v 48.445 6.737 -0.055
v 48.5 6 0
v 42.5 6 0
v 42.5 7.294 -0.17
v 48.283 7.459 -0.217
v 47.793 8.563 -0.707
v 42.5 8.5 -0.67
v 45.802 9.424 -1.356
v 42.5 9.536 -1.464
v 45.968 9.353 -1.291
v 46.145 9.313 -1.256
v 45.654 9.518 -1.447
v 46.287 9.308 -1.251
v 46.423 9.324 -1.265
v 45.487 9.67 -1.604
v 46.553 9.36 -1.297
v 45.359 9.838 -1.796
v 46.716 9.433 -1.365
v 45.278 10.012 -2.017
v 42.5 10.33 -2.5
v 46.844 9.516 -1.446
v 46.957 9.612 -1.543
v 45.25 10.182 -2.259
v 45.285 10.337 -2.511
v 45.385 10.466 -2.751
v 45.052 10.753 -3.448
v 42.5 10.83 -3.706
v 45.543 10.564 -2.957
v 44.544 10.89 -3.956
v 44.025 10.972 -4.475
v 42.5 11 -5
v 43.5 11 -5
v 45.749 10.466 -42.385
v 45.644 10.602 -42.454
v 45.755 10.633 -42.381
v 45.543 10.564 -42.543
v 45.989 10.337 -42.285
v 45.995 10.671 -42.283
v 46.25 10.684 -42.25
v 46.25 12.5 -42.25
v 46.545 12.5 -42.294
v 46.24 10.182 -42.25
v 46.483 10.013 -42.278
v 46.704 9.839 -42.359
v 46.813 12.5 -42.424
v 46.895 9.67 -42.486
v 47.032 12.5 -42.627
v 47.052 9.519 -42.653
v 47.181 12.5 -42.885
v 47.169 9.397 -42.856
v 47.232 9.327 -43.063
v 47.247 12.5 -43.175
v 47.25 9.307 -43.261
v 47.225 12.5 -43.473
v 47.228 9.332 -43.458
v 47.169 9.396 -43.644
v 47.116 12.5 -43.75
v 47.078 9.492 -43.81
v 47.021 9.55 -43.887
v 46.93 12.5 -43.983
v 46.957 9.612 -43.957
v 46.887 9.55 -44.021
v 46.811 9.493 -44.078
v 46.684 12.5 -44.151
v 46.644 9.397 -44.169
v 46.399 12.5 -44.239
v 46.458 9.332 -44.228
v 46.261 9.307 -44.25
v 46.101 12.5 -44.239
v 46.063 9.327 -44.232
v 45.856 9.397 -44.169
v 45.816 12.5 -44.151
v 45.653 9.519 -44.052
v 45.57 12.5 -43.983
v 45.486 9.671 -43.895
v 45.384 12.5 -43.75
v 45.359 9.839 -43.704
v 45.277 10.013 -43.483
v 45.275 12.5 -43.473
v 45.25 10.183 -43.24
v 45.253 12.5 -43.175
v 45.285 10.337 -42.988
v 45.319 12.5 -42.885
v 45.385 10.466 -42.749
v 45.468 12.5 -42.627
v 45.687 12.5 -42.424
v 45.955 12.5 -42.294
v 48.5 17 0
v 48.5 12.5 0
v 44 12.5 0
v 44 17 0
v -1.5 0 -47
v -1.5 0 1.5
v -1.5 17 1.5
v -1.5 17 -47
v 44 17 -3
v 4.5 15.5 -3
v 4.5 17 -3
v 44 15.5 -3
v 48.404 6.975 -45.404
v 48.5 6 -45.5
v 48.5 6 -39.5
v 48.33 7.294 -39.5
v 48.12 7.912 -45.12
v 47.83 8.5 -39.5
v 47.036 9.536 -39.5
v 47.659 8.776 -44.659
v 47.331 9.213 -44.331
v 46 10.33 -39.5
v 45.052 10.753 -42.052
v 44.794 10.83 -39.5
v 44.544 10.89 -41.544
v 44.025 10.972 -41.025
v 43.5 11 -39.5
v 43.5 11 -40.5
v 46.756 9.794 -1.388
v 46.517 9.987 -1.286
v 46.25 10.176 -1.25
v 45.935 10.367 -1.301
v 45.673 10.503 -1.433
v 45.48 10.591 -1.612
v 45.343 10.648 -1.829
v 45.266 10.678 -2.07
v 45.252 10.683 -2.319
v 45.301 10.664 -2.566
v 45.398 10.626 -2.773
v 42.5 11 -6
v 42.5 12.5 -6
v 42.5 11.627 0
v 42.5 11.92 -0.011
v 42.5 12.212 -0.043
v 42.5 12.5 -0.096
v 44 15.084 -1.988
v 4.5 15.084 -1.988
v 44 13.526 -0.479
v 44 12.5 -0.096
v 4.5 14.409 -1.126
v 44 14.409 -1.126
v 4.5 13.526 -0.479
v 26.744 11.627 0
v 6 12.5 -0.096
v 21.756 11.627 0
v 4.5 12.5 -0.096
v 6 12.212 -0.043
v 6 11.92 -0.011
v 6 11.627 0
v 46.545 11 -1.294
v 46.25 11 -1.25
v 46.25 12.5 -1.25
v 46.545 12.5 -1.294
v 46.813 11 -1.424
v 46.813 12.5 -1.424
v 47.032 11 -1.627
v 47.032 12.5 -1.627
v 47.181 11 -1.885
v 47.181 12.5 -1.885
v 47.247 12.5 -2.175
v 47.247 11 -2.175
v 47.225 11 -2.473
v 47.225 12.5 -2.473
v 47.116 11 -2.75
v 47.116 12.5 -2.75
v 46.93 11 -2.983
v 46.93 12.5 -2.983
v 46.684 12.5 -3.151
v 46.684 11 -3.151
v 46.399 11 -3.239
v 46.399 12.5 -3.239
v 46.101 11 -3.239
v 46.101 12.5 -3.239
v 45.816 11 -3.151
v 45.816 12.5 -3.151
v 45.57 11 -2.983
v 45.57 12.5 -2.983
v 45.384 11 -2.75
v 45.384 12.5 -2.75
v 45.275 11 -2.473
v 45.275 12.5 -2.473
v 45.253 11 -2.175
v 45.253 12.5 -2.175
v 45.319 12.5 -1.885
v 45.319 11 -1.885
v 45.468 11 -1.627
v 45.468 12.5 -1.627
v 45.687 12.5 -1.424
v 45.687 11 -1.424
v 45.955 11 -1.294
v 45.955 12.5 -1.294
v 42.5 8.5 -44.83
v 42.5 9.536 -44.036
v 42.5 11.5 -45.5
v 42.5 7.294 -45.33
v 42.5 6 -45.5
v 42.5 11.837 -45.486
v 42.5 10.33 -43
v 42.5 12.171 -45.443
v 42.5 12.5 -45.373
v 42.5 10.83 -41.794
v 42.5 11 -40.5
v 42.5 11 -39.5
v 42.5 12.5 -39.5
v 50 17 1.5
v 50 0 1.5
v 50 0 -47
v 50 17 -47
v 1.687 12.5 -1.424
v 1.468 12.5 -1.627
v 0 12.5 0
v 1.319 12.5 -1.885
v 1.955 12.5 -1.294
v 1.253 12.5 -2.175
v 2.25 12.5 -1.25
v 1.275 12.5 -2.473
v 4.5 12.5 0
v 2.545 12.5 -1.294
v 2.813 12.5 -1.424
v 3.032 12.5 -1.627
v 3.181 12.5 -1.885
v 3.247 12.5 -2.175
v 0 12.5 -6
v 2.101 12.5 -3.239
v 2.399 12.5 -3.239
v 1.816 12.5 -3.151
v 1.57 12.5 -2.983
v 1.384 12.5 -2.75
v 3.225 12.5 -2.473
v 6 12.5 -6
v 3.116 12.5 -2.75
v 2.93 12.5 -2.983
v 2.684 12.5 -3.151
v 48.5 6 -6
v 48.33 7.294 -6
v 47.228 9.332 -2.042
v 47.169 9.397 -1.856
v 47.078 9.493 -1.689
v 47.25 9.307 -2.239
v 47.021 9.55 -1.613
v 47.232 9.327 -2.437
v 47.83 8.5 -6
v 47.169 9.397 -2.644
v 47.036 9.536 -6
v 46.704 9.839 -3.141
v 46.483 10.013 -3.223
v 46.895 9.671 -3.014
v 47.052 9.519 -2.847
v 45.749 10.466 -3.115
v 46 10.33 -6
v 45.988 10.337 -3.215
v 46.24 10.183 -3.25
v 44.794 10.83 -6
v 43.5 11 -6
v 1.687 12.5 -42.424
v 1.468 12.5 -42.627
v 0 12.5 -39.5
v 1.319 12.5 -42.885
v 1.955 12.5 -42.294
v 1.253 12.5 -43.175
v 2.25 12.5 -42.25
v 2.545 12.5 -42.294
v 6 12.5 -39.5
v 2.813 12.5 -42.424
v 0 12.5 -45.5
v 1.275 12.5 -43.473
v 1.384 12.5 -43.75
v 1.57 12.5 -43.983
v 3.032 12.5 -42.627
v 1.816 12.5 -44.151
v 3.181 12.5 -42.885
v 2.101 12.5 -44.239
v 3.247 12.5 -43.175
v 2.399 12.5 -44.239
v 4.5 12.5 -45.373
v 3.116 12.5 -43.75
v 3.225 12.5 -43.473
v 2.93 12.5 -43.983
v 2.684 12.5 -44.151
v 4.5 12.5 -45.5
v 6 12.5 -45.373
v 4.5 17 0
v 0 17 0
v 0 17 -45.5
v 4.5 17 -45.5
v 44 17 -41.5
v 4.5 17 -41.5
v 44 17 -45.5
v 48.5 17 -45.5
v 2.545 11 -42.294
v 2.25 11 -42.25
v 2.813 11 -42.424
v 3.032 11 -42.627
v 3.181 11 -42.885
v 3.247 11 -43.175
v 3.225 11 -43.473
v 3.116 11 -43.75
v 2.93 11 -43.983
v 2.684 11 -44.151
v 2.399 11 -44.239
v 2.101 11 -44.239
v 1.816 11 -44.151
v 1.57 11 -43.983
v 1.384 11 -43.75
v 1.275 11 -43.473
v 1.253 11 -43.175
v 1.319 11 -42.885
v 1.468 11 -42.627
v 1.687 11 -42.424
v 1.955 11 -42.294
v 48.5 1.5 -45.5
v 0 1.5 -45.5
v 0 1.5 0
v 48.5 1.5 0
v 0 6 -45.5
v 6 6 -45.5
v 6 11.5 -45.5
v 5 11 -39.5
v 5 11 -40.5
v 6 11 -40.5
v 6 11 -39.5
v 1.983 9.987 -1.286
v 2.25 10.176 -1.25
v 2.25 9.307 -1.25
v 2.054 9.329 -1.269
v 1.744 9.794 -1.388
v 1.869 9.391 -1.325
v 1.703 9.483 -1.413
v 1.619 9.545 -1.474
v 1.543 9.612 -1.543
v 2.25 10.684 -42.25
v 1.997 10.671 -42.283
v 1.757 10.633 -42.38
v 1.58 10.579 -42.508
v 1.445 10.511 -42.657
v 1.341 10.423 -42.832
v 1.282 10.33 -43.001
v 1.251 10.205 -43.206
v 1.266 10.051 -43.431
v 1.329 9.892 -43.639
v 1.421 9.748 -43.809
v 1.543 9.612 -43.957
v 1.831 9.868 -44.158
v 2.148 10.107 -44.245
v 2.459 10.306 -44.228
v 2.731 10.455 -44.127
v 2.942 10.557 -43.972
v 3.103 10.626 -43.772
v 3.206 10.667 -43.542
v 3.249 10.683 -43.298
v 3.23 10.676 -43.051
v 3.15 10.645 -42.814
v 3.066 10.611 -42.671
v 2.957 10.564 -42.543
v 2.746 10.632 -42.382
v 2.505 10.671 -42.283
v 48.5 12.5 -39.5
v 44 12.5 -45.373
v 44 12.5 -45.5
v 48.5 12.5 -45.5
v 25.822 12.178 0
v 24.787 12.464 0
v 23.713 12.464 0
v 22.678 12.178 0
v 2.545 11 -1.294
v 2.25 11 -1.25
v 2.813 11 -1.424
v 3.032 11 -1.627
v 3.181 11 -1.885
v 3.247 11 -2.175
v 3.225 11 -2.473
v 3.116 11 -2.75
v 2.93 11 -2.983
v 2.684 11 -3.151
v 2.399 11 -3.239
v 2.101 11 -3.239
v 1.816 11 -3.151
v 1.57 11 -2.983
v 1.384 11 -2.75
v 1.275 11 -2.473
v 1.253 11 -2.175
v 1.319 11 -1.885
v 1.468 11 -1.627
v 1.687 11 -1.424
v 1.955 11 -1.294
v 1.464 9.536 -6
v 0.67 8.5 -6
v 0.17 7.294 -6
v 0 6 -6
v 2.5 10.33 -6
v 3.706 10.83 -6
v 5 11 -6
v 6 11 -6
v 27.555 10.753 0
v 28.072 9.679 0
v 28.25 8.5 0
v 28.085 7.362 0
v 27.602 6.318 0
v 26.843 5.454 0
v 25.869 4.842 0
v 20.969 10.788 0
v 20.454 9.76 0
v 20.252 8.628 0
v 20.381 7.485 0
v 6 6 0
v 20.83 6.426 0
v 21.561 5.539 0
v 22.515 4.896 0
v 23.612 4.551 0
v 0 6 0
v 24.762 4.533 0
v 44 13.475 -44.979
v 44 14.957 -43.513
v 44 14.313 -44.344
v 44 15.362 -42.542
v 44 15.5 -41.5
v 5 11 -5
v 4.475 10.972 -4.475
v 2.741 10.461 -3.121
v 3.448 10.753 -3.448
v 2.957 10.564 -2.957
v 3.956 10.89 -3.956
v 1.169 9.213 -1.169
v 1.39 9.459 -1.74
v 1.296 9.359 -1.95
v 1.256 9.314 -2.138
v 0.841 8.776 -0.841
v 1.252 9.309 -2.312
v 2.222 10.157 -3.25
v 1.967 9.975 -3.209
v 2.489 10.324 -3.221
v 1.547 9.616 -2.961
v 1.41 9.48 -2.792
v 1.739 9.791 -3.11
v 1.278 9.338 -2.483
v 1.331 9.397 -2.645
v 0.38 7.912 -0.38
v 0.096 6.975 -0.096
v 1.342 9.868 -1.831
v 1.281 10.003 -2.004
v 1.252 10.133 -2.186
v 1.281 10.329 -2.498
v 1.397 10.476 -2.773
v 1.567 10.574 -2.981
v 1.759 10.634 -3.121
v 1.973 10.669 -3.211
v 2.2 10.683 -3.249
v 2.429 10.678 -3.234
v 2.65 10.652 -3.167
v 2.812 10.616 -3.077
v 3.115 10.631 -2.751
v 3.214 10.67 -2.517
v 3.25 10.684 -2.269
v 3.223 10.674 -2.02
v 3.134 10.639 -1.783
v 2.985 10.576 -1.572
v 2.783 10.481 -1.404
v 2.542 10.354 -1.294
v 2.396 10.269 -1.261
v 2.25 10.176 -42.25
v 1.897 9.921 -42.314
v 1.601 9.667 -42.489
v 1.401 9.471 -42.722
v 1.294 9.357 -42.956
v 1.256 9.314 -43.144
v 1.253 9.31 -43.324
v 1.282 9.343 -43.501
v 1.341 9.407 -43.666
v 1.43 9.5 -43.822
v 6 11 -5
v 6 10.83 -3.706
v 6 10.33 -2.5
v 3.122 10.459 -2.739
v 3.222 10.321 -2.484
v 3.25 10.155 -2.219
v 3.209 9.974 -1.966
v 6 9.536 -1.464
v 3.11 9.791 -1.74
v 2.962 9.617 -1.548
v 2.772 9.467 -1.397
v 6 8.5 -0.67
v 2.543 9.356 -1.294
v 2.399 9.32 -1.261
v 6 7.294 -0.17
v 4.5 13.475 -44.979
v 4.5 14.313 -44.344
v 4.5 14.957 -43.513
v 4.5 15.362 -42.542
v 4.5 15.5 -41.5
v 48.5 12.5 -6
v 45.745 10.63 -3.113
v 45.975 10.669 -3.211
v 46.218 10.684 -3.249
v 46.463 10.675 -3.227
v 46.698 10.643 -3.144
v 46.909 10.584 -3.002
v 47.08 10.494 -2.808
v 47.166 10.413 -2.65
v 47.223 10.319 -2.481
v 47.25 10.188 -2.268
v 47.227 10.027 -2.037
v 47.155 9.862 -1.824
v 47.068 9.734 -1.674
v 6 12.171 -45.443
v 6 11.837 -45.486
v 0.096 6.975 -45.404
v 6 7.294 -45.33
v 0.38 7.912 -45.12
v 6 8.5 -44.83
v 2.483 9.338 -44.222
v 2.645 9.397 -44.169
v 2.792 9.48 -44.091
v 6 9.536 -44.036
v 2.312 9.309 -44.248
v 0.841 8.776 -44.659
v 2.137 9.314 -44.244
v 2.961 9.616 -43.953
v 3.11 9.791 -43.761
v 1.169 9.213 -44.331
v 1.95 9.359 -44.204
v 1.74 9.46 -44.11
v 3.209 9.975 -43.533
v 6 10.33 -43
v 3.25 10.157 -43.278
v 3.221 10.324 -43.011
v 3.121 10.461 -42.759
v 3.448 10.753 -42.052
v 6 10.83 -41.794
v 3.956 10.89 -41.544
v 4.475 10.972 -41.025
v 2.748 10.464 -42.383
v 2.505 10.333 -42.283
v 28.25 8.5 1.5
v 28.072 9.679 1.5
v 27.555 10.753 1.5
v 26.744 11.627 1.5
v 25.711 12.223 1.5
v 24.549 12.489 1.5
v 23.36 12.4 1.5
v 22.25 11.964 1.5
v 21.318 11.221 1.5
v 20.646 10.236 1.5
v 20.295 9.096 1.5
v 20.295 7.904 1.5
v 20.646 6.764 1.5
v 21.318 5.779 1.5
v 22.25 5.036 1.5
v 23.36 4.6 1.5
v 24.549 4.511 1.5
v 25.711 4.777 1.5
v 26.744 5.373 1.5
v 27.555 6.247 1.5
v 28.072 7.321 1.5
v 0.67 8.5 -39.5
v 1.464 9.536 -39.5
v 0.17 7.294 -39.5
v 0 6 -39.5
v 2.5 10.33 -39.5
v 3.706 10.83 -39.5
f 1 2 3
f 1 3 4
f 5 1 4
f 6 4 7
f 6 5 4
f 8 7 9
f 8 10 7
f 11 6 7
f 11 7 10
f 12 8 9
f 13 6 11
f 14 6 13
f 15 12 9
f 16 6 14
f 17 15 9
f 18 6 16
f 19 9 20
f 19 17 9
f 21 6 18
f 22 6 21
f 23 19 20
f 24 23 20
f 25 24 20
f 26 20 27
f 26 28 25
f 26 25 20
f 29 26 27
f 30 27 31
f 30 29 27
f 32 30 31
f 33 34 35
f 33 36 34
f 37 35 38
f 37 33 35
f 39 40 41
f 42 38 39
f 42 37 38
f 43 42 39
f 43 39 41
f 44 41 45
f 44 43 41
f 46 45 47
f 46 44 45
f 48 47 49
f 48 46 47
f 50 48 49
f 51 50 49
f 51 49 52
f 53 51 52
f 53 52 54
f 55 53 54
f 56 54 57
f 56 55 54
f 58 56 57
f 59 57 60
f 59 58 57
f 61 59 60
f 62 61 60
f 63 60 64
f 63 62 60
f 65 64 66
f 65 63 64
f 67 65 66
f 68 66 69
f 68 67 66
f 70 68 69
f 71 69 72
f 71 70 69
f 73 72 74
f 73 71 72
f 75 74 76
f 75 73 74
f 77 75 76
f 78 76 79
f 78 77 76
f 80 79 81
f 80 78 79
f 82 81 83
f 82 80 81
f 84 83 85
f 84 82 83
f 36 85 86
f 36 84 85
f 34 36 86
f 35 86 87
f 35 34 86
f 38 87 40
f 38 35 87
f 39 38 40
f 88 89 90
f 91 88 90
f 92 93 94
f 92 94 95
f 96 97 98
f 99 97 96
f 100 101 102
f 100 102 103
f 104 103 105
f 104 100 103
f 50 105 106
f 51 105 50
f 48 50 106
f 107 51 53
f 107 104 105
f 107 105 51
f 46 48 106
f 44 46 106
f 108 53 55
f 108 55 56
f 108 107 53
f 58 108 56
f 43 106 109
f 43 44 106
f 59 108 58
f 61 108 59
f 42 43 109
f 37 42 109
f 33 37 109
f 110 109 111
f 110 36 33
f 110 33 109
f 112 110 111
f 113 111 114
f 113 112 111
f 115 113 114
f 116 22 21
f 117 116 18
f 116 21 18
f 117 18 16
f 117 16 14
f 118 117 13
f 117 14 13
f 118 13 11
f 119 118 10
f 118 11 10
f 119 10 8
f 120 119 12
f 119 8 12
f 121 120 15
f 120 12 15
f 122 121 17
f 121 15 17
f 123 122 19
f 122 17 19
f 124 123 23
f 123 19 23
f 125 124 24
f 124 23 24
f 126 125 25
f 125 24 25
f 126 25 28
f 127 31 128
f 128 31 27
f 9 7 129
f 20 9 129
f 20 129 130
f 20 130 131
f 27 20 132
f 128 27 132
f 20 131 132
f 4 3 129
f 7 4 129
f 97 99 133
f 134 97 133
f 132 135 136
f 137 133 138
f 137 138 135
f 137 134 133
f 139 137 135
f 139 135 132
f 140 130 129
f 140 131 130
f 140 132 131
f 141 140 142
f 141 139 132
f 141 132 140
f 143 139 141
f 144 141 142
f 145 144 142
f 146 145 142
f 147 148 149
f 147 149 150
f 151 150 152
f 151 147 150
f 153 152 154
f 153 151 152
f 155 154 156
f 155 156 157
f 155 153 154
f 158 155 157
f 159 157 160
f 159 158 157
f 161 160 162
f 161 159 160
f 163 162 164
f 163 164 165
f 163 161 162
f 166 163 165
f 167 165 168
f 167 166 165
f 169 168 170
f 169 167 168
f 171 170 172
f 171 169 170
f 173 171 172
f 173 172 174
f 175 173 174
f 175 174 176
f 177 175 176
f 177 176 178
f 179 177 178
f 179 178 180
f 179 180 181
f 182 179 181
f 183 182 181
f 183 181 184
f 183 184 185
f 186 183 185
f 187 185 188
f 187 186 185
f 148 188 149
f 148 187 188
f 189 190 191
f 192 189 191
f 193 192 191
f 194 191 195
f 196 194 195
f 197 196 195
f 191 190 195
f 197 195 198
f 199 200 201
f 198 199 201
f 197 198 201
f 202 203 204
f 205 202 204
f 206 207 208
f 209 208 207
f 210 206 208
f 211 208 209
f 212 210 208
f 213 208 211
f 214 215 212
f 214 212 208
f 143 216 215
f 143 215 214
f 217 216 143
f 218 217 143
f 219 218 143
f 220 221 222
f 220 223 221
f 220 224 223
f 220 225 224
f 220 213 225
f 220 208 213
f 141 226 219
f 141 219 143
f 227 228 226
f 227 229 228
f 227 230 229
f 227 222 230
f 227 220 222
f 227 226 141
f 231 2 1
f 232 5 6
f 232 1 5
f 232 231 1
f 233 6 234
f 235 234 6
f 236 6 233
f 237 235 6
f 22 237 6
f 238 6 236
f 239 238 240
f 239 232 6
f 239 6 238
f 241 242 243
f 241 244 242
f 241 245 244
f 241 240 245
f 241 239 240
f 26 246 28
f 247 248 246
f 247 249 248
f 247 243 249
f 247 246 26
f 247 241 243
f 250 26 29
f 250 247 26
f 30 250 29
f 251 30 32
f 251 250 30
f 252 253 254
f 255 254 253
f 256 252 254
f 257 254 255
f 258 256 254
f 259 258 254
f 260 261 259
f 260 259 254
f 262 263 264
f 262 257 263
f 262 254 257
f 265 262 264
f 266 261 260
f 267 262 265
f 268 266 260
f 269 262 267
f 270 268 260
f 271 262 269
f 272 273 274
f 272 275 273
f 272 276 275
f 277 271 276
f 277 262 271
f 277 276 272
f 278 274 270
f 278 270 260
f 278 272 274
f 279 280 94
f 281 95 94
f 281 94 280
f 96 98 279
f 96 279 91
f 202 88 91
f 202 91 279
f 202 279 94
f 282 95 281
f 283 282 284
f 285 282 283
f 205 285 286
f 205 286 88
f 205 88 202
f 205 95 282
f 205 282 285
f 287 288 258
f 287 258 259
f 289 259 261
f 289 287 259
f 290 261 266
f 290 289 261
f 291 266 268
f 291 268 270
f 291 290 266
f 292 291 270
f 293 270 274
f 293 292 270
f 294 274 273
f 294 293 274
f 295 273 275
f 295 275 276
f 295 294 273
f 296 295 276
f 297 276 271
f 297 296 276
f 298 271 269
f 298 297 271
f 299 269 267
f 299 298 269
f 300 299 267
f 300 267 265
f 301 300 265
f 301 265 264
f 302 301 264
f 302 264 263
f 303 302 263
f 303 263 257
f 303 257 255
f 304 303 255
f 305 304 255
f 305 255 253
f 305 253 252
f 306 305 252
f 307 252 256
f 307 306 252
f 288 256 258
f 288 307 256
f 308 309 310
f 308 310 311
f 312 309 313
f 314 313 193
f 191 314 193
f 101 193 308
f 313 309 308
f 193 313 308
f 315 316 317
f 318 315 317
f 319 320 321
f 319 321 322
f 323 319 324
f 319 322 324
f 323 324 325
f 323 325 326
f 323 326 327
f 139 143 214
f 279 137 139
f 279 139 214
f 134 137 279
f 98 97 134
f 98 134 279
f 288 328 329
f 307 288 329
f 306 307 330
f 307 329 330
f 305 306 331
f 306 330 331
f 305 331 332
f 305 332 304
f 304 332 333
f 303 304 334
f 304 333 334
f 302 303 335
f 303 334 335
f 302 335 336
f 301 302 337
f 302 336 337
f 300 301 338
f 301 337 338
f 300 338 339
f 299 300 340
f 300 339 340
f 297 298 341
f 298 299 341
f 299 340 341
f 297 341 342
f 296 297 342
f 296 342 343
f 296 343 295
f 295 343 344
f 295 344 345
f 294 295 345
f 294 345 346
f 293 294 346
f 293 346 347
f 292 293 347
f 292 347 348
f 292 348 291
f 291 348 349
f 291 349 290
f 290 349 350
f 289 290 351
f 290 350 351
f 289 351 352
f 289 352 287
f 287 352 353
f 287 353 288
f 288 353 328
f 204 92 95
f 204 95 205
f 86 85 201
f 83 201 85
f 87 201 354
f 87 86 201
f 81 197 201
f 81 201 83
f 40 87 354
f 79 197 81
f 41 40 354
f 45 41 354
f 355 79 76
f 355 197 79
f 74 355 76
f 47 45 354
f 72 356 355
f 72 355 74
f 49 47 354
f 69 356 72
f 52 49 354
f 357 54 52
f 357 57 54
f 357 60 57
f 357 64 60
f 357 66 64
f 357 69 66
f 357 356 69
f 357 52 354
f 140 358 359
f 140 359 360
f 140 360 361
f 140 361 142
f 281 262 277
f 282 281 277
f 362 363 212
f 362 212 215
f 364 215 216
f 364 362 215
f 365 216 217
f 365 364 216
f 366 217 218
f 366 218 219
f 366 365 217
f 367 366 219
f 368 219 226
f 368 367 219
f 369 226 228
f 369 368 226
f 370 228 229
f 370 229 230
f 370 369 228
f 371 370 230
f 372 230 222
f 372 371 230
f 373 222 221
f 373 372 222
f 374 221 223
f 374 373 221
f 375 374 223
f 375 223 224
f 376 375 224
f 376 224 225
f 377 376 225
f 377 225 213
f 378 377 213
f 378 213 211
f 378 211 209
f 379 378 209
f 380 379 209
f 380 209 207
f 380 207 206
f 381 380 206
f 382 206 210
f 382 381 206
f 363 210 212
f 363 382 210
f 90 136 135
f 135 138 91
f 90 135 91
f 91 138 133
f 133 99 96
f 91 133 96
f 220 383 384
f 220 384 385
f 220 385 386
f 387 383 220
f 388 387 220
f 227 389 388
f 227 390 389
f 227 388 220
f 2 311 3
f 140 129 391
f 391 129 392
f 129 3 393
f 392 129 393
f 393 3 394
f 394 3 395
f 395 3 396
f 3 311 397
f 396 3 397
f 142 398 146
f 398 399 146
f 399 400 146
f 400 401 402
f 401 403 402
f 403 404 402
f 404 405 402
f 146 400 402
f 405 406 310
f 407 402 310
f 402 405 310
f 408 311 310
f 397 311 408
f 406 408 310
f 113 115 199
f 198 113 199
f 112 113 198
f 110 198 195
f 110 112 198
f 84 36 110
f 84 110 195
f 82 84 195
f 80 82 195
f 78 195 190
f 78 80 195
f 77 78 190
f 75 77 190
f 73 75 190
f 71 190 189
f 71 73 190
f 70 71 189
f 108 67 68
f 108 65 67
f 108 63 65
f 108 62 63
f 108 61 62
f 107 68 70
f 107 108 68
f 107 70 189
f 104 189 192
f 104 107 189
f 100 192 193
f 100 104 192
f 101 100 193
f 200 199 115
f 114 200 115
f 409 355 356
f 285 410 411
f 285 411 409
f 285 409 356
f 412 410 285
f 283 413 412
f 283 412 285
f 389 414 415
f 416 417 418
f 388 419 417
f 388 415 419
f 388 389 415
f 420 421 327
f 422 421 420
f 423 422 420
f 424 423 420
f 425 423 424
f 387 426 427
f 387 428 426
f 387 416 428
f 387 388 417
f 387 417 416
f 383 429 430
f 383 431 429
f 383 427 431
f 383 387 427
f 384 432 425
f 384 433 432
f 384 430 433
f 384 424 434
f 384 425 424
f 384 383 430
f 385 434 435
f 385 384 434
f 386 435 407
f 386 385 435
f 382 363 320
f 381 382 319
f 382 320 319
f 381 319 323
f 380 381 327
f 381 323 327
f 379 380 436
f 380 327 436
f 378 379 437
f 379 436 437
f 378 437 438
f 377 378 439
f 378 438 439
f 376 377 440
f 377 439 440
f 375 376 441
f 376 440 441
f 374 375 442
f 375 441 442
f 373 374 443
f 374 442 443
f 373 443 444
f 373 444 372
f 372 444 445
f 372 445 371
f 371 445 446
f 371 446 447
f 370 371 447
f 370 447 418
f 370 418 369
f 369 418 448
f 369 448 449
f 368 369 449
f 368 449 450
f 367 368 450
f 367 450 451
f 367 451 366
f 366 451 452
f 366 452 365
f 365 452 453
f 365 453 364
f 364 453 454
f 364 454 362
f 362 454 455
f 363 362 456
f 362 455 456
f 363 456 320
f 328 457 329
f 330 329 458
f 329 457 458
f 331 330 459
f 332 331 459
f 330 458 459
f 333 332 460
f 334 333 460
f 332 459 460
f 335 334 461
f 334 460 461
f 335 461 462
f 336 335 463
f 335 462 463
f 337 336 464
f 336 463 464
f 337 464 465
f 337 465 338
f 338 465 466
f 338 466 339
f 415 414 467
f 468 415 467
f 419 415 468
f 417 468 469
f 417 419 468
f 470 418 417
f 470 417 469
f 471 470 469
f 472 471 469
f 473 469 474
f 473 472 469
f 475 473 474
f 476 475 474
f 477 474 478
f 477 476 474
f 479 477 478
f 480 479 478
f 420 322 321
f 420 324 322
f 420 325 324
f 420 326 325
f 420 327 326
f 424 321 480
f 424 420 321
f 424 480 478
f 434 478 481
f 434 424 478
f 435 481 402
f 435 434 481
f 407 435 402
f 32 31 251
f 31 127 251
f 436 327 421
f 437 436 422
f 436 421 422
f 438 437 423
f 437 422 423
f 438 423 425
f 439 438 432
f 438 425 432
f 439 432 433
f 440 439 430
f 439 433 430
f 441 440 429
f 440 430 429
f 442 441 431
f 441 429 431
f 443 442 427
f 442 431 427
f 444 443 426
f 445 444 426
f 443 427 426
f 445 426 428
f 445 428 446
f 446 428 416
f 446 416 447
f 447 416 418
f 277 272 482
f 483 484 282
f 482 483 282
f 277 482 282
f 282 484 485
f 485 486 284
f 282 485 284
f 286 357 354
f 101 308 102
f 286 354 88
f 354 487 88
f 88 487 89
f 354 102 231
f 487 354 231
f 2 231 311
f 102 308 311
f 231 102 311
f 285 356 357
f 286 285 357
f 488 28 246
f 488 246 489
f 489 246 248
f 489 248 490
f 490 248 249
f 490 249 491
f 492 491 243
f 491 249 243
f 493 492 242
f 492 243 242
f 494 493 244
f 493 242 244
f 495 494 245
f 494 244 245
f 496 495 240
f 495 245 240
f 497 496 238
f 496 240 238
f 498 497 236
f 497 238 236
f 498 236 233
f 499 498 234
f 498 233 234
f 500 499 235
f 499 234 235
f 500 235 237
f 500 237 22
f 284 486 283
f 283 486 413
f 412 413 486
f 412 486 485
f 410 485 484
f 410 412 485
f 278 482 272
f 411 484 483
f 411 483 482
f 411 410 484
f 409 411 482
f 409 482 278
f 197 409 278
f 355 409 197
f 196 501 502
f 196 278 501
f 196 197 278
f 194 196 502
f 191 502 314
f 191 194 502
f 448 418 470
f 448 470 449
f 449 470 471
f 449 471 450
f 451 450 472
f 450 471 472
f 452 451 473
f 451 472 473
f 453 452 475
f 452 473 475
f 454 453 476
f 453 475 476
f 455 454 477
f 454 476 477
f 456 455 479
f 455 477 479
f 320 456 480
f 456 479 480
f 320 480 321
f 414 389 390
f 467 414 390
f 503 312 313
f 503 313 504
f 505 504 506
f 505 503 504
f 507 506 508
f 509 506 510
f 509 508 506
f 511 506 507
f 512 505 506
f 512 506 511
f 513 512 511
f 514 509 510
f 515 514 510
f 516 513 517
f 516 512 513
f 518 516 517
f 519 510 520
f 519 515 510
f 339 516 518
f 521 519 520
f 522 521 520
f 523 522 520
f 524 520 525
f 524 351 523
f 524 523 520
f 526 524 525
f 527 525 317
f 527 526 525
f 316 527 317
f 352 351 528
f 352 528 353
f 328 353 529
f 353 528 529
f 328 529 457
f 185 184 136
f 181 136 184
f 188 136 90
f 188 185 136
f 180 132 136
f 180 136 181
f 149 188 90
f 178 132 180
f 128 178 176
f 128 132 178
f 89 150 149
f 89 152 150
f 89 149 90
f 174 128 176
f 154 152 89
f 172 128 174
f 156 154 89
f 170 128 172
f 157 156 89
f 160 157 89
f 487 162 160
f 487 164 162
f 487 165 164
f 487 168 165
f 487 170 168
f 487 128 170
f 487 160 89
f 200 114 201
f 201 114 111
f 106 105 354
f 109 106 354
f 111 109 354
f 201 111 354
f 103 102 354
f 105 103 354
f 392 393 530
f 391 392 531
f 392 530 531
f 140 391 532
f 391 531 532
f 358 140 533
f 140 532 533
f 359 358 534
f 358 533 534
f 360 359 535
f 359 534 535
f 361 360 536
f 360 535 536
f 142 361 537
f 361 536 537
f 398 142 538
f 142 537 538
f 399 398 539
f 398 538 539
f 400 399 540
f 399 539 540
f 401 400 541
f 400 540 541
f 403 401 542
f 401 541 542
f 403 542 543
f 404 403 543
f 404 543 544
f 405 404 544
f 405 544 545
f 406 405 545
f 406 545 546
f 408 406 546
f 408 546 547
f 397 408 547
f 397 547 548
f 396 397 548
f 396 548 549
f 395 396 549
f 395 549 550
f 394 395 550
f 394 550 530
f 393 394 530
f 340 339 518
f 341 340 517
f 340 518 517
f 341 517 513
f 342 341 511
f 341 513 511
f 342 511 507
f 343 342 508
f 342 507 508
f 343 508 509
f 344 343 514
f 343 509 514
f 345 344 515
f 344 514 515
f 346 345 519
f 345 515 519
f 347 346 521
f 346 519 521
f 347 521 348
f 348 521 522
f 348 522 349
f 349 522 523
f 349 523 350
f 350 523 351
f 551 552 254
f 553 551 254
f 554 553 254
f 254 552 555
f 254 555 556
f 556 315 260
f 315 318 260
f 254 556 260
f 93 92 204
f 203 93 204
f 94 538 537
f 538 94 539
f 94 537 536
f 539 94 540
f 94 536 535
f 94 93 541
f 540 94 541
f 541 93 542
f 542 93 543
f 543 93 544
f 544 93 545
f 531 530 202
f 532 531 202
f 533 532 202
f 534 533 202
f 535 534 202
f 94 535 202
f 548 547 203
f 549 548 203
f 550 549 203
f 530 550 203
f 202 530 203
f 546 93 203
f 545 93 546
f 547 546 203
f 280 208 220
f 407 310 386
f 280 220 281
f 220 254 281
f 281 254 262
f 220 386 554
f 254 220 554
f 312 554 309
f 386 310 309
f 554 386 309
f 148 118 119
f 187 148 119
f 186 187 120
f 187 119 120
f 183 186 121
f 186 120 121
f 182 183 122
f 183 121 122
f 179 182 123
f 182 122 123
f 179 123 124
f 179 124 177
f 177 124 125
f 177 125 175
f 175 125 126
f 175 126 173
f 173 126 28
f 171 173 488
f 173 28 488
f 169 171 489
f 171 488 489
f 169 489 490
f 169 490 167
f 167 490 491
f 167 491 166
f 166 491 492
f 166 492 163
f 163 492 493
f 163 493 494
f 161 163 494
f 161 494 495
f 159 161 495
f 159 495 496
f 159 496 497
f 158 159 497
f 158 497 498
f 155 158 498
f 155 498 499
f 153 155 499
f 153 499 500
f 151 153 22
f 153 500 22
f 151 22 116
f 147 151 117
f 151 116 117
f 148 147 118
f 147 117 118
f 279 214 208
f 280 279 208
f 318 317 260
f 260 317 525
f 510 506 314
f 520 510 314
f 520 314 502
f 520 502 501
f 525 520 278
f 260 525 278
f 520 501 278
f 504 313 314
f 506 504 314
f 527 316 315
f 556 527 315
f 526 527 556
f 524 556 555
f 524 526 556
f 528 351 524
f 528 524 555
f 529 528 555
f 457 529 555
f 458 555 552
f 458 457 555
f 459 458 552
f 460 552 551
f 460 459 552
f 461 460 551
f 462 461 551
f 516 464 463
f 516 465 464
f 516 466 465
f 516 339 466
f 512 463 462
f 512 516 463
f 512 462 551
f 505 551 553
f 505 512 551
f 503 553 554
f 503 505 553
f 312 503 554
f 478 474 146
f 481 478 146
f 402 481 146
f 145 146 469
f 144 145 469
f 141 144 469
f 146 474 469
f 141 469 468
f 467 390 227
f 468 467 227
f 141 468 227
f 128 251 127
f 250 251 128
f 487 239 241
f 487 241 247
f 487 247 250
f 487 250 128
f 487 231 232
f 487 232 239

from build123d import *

# Parameters (mm, degrees)
SKETCH1_W          = 51.5
SKETCH1_H          = 48.5
BASE_DEPTH         = 1.5
SKETCH1_6_W        = 51.5
SKETCH1_6_H        = 48.5
WALLS_DEPTH        = 17
SCREWS_START       = 11
SKETCH1_7_R        = 1
SKETCH1_7_W        = 1.5
SKETCH1_7_H        = 3
SKETCH1_7_H_2      = 4
SCREWS_DEPTH       = 1.5
TOP_START          = 15.5
SKETCH1_8_W        = 39.5
SKETCH1_8_H        = 3
SKETCH1_8_H_2      = 4
TOP_DEPTH          = 1.5
FILLET1_R          = 5
FILLET3_R          = 4
SKETCH2_R          = 4
CUT_EXTRUDE1_DEPTH = 1.5


with BuildPart() as part:
    # Sketch1 → base (new body)
    with BuildSketch(Plane(origin=(0, 0, 0), x_dir=(1, 0, 0), z_dir=(0, 1, 0))):
        with Locations((24.25, 22.75)):
            Rectangle(SKETCH1_W, SKETCH1_H)
    extrude(amount=BASE_DEPTH)

    # Sketch1<6> → walls (add)
    with BuildSketch(Plane(origin=(0, 0, 0), x_dir=(1, 0, 0), z_dir=(0, 1, 0))):
        with Locations((24.25, 22.75)):
            Rectangle(SKETCH1_6_W, SKETCH1_6_H)
        Polygon((4.5, 0), (0, 0), (0, 4.5), (0, 6), (0, 39.5), (0, 41), (0, 45.5), (4.5, 45.5), (6, 45.5), (42.5, 45.5), (44, 45.5), (48.5, 45.5), (48.5, 41), (48.5, 39.5), (48.5, 6), (48.5, 4.5), (48.5, 0), (44, 0), (42.5, 0), (6, 0), align=None, mode=Mode.SUBTRACT)
    extrude(amount=WALLS_DEPTH)

    # Sketch1<7> → screws (add)
    # profile 1 of 12: a face of its own
    with BuildSketch(Plane(origin=(0, 0, 0), x_dir=(1, 0, 0), z_dir=(0, 1, 0)).offset(SCREWS_START)):
        Polygon((44, 3), (44, 0), (48.5, 0), (48.5, 4.5), (44, 4.5), align=None)
        with Locations(Location((46.25, 2.25, 0), (0, 0, 270))):
            Circle(SKETCH1_7_R, mode=Mode.SUBTRACT)
    # profile 2 of 12: a face of its own
    with BuildSketch(Plane(origin=(0, 0, 0), x_dir=(1, 0, 0), z_dir=(0, 1, 0)).offset(SCREWS_START)):
        Polygon((42.5, 6), (42.5, 3), (44, 3), (44, 4.5), (48.5, 4.5), (48.5, 6), align=None)
    # profile 3 of 12: a face of its own
    with BuildSketch(Plane(origin=(0, 0, 0), x_dir=(1, 0, 0), z_dir=(0, 1, 0)).offset(SCREWS_START)):
        with Locations((43.25, 1.5)):
            Rectangle(SKETCH1_7_W, SKETCH1_7_H)
    # profile 4 of 12: a face of its own
    with BuildSketch(Plane(origin=(0, 0, 0), x_dir=(1, 0, 0), z_dir=(0, 1, 0)).offset(SCREWS_START)):
        Polygon((44, 41.5), (42.5, 41.5), (42.5, 39.5), (48.5, 39.5), (48.5, 41), (44, 41), align=None)
    # profile 5 of 12: a face of its own
    with BuildSketch(Plane(origin=(0, 0, 0), x_dir=(1, 0, 0), z_dir=(0, 1, 0)).offset(SCREWS_START)):
        Polygon((44, 45.5), (44, 41.5), (44, 41), (48.5, 41), (48.5, 45.5), align=None)
        with Locations(Location((46.25, 43.25, 0), (0, 0, 270))):
            Circle(SKETCH1_7_R, mode=Mode.SUBTRACT)
    # profile 6 of 12: a face of its own
    with BuildSketch(Plane(origin=(0, 0, 0), x_dir=(1, 0, 0), z_dir=(0, 1, 0)).offset(SCREWS_START)):
        with Locations((43.25, 43.5)):
            Rectangle(SKETCH1_7_W, SKETCH1_7_H_2)
    # profile 7 of 12: a face of its own
    with BuildSketch(Plane(origin=(0, 0, 0), x_dir=(1, 0, 0), z_dir=(0, 1, 0)).offset(SCREWS_START)):
        Polygon((0, 41), (0, 39.5), (6, 39.5), (6, 41.5), (4.5, 41.5), (4.5, 41), align=None)
    # profile 8 of 12: a face of its own
    with BuildSketch(Plane(origin=(0, 0, 0), x_dir=(1, 0, 0), z_dir=(0, 1, 0)).offset(SCREWS_START)):
        Polygon((0, 45.5), (0, 41), (4.5, 41), (4.5, 41.5), (4.5, 45.5), align=None)
        with Locations(Location((2.25, 43.25, 0), (0, 0, 270))):
            Circle(SKETCH1_7_R, mode=Mode.SUBTRACT)
    # profile 9 of 12: a face of its own
    with BuildSketch(Plane(origin=(0, 0, 0), x_dir=(1, 0, 0), z_dir=(0, 1, 0)).offset(SCREWS_START)):
        with Locations((5.25, 43.5)):
            Rectangle(SKETCH1_7_W, SKETCH1_7_H_2)
    # profile 10 of 12: a face of its own
    with BuildSketch(Plane(origin=(0, 0, 0), x_dir=(1, 0, 0), z_dir=(0, 1, 0)).offset(SCREWS_START)):
        Polygon((0, 4.5), (0, 0), (4.5, 0), (4.5, 3), (4.5, 4.5), align=None)
        with Locations(Location((2.25, 2.25, 0), (0, 0, 270))):
            Circle(SKETCH1_7_R, mode=Mode.SUBTRACT)
    # profile 11 of 12: a face of its own
    with BuildSketch(Plane(origin=(0, 0, 0), x_dir=(1, 0, 0), z_dir=(0, 1, 0)).offset(SCREWS_START)):
        Polygon((0, 6), (0, 4.5), (4.5, 4.5), (4.5, 3), (6, 3), (6, 6), align=None)
    # profile 12 of 12: a face of its own
    with BuildSketch(Plane(origin=(0, 0, 0), x_dir=(1, 0, 0), z_dir=(0, 1, 0)).offset(SCREWS_START)):
        with Locations((5.25, 1.5)):
            Rectangle(SKETCH1_7_W, SKETCH1_7_H)
    extrude(amount=SCREWS_DEPTH)

    # Sketch1<8> → top (add)
    with BuildSketch(Plane(origin=(0, 0, 0), x_dir=(1, 0, 0), z_dir=(0, 1, 0)).offset(TOP_START)):
        with Locations((24.25, 1.5)):
            Rectangle(SKETCH1_8_W, SKETCH1_8_H)
        with Locations((24.25, 43.5)):
            Rectangle(SKETCH1_8_W, SKETCH1_8_H_2)
    extrude(amount=TOP_DEPTH)

    # Fillet1
    # the kernel refuses this fillet: 5 mm, written as the material it adds along each edge
    with BuildSketch(Plane(origin=(0, 11, 0), x_dir=(0, -1, 0), z_dir=(1, 0, 0))) as fillet1_piece_1_section:
        with BuildLine():
            CenterArc((FILLET1_R, FILLET1_R), FILLET1_R, 180, 90)
            Line((0, FILLET1_R), (0, 0))
            Line((0, 0), (FILLET1_R, 0))
        make_face()
    fillet1_piece_1 = extrude(amount=6, mode=Mode.PRIVATE)
    fillet1_piece_1 = fillet1_piece_1 - Plane(origin=(2.25, 9.80856061, -2.25), x_dir=(0, 0, 1), z_dir=(0, -1, 0)) * Cylinder(1, 33, mode=Mode.PRIVATE)
    add(fillet1_piece_1)
    with BuildSketch(Plane(origin=(0, 11, -6), x_dir=(0, -1, 0), z_dir=(0, 0, 1))) as fillet1_piece_2_section:
        with BuildLine():
            CenterArc((FILLET1_R, FILLET1_R), FILLET1_R, 180, 90)
            Line((0, FILLET1_R), (0, 0))
            Line((0, 0), (FILLET1_R, 0))
        make_face()
    fillet1_piece_2 = extrude(amount=6, mode=Mode.PRIVATE)
    fillet1_piece_2 = fillet1_piece_2 - Plane(origin=(2.25, 9.808553236, -2.25), x_dir=(0, 0, 1), z_dir=(0, -1, 0)) * Cylinder(1, 32, mode=Mode.PRIVATE)
    add(fillet1_piece_2)
    with BuildSketch(Plane(origin=(0, 11, -45.5), x_dir=(0, -1, 0), z_dir=(0, 0, 1))) as fillet1_piece_3_section:
        with BuildLine():
            CenterArc((FILLET1_R, FILLET1_R), FILLET1_R, 180, 90)
            Line((0, FILLET1_R), (0, 0))
            Line((0, 0), (FILLET1_R, 0))
        make_face()
    fillet1_piece_3 = extrude(amount=6, mode=Mode.PRIVATE)
    fillet1_piece_3 = fillet1_piece_3 - Plane(origin=(2.25, 9.808553112, -43.25), x_dir=(0, 0, 1), z_dir=(0, -1, 0)) * Cylinder(1, 32, mode=Mode.PRIVATE)
    add(fillet1_piece_3)
    with BuildSketch(Plane(origin=(0, 11, -45.5), x_dir=(0, -1, 0), z_dir=(1, 0, 0))) as fillet1_piece_4_section:
        with BuildLine():
            CenterArc((FILLET1_R, -FILLET1_R), FILLET1_R, 90, 90)
            Line((0, -FILLET1_R), (0, 0))
            Line((0, 0), (FILLET1_R, 0))
        make_face()
    fillet1_piece_4 = extrude(amount=6, mode=Mode.PRIVATE)
    fillet1_piece_4 = fillet1_piece_4 - Plane(origin=(2.25, 9.808558943, -43.25), x_dir=(0, 0, 1), z_dir=(0, -1, 0)) * Cylinder(1, 33, mode=Mode.PRIVATE)
    add(fillet1_piece_4)
    with BuildSketch(Plane(origin=(48.5, 11, -45.5), x_dir=(0, -1, 0), z_dir=(-1, 0, 0))) as fillet1_piece_5_section:
        with BuildLine():
            CenterArc((FILLET1_R, FILLET1_R), FILLET1_R, 180, 90)
            Line((0, FILLET1_R), (0, 0))
            Line((0, 0), (FILLET1_R, 0))
        make_face()
    fillet1_piece_5 = extrude(amount=6, mode=Mode.PRIVATE)
    fillet1_piece_5 = fillet1_piece_5 - Plane(origin=(46.25, 9.808558971, -43.25), x_dir=(0, 0, 1), z_dir=(0, -1, 0)) * Cylinder(1, 33, mode=Mode.PRIVATE)
    add(fillet1_piece_5)
    with BuildSketch(Plane(origin=(48.5, 11, -45.5), x_dir=(0, -1, 0), z_dir=(0, 0, 1))) as fillet1_piece_6_section:
        with BuildLine():
            CenterArc((FILLET1_R, -FILLET1_R), FILLET1_R, 90, 90)
            Line((0, -FILLET1_R), (0, 0))
            Line((0, 0), (FILLET1_R, 0))
        make_face()
    fillet1_piece_6 = extrude(amount=6, mode=Mode.PRIVATE)
    fillet1_piece_6 = fillet1_piece_6 - Plane(origin=(46.25, 9.808552814, -43.25), x_dir=(0, 0, 1), z_dir=(0, -1, 0)) * Cylinder(1, 33, mode=Mode.PRIVATE)
    add(fillet1_piece_6)
    with BuildSketch(Plane(origin=(48.5, 11, -6), x_dir=(0, -1, 0), z_dir=(0, 0, 1))) as fillet1_piece_7_section:
        with BuildLine():
            CenterArc((FILLET1_R, -FILLET1_R), FILLET1_R, 90, 90)
            Line((0, -FILLET1_R), (0, 0))
            Line((0, 0), (FILLET1_R, 0))
        make_face()
    fillet1_piece_7 = extrude(amount=6, mode=Mode.PRIVATE)
    fillet1_piece_7 = fillet1_piece_7 - Plane(origin=(46.25, 9.808552873, -2.25), x_dir=(0, 0, 1), z_dir=(0, -1, 0)) * Cylinder(1, 33, mode=Mode.PRIVATE)
    add(fillet1_piece_7)
    with BuildSketch(Plane(origin=(48.5, 11, 0), x_dir=(0, -1, 0), z_dir=(-1, 0, 0))) as fillet1_piece_8_section:
        with BuildLine():
            CenterArc((FILLET1_R, -FILLET1_R), FILLET1_R, 90, 90)
            Line((0, -FILLET1_R), (0, 0))
            Line((0, 0), (FILLET1_R, 0))
        make_face()
    fillet1_piece_8 = extrude(amount=6, mode=Mode.PRIVATE)
    fillet1_piece_8 = fillet1_piece_8 - Plane(origin=(46.25, 9.808560411, -2.25), x_dir=(0, 0, 1), z_dir=(0, -1, 0)) * Cylinder(1, 32, mode=Mode.PRIVATE)
    add(fillet1_piece_8)

    # Fillet3
    # the kernel refuses this fillet: 4 mm, written as the material it adds along each edge
    with BuildSketch(Plane(origin=(4.5, 15.5, 0), x_dir=(0, -1, 0), z_dir=(1, 0, 0))) as fillet3_piece_1:
        with BuildLine():
            CenterArc((3.872983346, 4), FILLET3_R, 194.477512186, 75.522487814)
            Line((0, 3), (0, 0))
            Line((0, 0), (3.872983346, 0))
        make_face()
    extrude(amount=39.5)
    with BuildSketch(Plane(origin=(44, 15.5, -45.5), x_dir=(0, -1, 0), z_dir=(-1, 0, 0))) as fillet3_piece_2:
        with BuildLine():
            CenterArc((FILLET3_R, FILLET3_R), FILLET3_R, 180, 90)
            Line((0, FILLET3_R), (0, 0))
            Line((0, 0), (FILLET3_R, 0))
        make_face()
    extrude(amount=39.5)

    # Sketch2 → Cut-Extrude1 (cut)
    with BuildSketch(Plane.XY.offset(1.5)):
        with Locations((24.25, 8.5)):
            Circle(SKETCH2_R)
    extrude(amount=-CUT_EXTRUDE1_DEPTH, mode=Mode.SUBTRACT)


solid = part.part
